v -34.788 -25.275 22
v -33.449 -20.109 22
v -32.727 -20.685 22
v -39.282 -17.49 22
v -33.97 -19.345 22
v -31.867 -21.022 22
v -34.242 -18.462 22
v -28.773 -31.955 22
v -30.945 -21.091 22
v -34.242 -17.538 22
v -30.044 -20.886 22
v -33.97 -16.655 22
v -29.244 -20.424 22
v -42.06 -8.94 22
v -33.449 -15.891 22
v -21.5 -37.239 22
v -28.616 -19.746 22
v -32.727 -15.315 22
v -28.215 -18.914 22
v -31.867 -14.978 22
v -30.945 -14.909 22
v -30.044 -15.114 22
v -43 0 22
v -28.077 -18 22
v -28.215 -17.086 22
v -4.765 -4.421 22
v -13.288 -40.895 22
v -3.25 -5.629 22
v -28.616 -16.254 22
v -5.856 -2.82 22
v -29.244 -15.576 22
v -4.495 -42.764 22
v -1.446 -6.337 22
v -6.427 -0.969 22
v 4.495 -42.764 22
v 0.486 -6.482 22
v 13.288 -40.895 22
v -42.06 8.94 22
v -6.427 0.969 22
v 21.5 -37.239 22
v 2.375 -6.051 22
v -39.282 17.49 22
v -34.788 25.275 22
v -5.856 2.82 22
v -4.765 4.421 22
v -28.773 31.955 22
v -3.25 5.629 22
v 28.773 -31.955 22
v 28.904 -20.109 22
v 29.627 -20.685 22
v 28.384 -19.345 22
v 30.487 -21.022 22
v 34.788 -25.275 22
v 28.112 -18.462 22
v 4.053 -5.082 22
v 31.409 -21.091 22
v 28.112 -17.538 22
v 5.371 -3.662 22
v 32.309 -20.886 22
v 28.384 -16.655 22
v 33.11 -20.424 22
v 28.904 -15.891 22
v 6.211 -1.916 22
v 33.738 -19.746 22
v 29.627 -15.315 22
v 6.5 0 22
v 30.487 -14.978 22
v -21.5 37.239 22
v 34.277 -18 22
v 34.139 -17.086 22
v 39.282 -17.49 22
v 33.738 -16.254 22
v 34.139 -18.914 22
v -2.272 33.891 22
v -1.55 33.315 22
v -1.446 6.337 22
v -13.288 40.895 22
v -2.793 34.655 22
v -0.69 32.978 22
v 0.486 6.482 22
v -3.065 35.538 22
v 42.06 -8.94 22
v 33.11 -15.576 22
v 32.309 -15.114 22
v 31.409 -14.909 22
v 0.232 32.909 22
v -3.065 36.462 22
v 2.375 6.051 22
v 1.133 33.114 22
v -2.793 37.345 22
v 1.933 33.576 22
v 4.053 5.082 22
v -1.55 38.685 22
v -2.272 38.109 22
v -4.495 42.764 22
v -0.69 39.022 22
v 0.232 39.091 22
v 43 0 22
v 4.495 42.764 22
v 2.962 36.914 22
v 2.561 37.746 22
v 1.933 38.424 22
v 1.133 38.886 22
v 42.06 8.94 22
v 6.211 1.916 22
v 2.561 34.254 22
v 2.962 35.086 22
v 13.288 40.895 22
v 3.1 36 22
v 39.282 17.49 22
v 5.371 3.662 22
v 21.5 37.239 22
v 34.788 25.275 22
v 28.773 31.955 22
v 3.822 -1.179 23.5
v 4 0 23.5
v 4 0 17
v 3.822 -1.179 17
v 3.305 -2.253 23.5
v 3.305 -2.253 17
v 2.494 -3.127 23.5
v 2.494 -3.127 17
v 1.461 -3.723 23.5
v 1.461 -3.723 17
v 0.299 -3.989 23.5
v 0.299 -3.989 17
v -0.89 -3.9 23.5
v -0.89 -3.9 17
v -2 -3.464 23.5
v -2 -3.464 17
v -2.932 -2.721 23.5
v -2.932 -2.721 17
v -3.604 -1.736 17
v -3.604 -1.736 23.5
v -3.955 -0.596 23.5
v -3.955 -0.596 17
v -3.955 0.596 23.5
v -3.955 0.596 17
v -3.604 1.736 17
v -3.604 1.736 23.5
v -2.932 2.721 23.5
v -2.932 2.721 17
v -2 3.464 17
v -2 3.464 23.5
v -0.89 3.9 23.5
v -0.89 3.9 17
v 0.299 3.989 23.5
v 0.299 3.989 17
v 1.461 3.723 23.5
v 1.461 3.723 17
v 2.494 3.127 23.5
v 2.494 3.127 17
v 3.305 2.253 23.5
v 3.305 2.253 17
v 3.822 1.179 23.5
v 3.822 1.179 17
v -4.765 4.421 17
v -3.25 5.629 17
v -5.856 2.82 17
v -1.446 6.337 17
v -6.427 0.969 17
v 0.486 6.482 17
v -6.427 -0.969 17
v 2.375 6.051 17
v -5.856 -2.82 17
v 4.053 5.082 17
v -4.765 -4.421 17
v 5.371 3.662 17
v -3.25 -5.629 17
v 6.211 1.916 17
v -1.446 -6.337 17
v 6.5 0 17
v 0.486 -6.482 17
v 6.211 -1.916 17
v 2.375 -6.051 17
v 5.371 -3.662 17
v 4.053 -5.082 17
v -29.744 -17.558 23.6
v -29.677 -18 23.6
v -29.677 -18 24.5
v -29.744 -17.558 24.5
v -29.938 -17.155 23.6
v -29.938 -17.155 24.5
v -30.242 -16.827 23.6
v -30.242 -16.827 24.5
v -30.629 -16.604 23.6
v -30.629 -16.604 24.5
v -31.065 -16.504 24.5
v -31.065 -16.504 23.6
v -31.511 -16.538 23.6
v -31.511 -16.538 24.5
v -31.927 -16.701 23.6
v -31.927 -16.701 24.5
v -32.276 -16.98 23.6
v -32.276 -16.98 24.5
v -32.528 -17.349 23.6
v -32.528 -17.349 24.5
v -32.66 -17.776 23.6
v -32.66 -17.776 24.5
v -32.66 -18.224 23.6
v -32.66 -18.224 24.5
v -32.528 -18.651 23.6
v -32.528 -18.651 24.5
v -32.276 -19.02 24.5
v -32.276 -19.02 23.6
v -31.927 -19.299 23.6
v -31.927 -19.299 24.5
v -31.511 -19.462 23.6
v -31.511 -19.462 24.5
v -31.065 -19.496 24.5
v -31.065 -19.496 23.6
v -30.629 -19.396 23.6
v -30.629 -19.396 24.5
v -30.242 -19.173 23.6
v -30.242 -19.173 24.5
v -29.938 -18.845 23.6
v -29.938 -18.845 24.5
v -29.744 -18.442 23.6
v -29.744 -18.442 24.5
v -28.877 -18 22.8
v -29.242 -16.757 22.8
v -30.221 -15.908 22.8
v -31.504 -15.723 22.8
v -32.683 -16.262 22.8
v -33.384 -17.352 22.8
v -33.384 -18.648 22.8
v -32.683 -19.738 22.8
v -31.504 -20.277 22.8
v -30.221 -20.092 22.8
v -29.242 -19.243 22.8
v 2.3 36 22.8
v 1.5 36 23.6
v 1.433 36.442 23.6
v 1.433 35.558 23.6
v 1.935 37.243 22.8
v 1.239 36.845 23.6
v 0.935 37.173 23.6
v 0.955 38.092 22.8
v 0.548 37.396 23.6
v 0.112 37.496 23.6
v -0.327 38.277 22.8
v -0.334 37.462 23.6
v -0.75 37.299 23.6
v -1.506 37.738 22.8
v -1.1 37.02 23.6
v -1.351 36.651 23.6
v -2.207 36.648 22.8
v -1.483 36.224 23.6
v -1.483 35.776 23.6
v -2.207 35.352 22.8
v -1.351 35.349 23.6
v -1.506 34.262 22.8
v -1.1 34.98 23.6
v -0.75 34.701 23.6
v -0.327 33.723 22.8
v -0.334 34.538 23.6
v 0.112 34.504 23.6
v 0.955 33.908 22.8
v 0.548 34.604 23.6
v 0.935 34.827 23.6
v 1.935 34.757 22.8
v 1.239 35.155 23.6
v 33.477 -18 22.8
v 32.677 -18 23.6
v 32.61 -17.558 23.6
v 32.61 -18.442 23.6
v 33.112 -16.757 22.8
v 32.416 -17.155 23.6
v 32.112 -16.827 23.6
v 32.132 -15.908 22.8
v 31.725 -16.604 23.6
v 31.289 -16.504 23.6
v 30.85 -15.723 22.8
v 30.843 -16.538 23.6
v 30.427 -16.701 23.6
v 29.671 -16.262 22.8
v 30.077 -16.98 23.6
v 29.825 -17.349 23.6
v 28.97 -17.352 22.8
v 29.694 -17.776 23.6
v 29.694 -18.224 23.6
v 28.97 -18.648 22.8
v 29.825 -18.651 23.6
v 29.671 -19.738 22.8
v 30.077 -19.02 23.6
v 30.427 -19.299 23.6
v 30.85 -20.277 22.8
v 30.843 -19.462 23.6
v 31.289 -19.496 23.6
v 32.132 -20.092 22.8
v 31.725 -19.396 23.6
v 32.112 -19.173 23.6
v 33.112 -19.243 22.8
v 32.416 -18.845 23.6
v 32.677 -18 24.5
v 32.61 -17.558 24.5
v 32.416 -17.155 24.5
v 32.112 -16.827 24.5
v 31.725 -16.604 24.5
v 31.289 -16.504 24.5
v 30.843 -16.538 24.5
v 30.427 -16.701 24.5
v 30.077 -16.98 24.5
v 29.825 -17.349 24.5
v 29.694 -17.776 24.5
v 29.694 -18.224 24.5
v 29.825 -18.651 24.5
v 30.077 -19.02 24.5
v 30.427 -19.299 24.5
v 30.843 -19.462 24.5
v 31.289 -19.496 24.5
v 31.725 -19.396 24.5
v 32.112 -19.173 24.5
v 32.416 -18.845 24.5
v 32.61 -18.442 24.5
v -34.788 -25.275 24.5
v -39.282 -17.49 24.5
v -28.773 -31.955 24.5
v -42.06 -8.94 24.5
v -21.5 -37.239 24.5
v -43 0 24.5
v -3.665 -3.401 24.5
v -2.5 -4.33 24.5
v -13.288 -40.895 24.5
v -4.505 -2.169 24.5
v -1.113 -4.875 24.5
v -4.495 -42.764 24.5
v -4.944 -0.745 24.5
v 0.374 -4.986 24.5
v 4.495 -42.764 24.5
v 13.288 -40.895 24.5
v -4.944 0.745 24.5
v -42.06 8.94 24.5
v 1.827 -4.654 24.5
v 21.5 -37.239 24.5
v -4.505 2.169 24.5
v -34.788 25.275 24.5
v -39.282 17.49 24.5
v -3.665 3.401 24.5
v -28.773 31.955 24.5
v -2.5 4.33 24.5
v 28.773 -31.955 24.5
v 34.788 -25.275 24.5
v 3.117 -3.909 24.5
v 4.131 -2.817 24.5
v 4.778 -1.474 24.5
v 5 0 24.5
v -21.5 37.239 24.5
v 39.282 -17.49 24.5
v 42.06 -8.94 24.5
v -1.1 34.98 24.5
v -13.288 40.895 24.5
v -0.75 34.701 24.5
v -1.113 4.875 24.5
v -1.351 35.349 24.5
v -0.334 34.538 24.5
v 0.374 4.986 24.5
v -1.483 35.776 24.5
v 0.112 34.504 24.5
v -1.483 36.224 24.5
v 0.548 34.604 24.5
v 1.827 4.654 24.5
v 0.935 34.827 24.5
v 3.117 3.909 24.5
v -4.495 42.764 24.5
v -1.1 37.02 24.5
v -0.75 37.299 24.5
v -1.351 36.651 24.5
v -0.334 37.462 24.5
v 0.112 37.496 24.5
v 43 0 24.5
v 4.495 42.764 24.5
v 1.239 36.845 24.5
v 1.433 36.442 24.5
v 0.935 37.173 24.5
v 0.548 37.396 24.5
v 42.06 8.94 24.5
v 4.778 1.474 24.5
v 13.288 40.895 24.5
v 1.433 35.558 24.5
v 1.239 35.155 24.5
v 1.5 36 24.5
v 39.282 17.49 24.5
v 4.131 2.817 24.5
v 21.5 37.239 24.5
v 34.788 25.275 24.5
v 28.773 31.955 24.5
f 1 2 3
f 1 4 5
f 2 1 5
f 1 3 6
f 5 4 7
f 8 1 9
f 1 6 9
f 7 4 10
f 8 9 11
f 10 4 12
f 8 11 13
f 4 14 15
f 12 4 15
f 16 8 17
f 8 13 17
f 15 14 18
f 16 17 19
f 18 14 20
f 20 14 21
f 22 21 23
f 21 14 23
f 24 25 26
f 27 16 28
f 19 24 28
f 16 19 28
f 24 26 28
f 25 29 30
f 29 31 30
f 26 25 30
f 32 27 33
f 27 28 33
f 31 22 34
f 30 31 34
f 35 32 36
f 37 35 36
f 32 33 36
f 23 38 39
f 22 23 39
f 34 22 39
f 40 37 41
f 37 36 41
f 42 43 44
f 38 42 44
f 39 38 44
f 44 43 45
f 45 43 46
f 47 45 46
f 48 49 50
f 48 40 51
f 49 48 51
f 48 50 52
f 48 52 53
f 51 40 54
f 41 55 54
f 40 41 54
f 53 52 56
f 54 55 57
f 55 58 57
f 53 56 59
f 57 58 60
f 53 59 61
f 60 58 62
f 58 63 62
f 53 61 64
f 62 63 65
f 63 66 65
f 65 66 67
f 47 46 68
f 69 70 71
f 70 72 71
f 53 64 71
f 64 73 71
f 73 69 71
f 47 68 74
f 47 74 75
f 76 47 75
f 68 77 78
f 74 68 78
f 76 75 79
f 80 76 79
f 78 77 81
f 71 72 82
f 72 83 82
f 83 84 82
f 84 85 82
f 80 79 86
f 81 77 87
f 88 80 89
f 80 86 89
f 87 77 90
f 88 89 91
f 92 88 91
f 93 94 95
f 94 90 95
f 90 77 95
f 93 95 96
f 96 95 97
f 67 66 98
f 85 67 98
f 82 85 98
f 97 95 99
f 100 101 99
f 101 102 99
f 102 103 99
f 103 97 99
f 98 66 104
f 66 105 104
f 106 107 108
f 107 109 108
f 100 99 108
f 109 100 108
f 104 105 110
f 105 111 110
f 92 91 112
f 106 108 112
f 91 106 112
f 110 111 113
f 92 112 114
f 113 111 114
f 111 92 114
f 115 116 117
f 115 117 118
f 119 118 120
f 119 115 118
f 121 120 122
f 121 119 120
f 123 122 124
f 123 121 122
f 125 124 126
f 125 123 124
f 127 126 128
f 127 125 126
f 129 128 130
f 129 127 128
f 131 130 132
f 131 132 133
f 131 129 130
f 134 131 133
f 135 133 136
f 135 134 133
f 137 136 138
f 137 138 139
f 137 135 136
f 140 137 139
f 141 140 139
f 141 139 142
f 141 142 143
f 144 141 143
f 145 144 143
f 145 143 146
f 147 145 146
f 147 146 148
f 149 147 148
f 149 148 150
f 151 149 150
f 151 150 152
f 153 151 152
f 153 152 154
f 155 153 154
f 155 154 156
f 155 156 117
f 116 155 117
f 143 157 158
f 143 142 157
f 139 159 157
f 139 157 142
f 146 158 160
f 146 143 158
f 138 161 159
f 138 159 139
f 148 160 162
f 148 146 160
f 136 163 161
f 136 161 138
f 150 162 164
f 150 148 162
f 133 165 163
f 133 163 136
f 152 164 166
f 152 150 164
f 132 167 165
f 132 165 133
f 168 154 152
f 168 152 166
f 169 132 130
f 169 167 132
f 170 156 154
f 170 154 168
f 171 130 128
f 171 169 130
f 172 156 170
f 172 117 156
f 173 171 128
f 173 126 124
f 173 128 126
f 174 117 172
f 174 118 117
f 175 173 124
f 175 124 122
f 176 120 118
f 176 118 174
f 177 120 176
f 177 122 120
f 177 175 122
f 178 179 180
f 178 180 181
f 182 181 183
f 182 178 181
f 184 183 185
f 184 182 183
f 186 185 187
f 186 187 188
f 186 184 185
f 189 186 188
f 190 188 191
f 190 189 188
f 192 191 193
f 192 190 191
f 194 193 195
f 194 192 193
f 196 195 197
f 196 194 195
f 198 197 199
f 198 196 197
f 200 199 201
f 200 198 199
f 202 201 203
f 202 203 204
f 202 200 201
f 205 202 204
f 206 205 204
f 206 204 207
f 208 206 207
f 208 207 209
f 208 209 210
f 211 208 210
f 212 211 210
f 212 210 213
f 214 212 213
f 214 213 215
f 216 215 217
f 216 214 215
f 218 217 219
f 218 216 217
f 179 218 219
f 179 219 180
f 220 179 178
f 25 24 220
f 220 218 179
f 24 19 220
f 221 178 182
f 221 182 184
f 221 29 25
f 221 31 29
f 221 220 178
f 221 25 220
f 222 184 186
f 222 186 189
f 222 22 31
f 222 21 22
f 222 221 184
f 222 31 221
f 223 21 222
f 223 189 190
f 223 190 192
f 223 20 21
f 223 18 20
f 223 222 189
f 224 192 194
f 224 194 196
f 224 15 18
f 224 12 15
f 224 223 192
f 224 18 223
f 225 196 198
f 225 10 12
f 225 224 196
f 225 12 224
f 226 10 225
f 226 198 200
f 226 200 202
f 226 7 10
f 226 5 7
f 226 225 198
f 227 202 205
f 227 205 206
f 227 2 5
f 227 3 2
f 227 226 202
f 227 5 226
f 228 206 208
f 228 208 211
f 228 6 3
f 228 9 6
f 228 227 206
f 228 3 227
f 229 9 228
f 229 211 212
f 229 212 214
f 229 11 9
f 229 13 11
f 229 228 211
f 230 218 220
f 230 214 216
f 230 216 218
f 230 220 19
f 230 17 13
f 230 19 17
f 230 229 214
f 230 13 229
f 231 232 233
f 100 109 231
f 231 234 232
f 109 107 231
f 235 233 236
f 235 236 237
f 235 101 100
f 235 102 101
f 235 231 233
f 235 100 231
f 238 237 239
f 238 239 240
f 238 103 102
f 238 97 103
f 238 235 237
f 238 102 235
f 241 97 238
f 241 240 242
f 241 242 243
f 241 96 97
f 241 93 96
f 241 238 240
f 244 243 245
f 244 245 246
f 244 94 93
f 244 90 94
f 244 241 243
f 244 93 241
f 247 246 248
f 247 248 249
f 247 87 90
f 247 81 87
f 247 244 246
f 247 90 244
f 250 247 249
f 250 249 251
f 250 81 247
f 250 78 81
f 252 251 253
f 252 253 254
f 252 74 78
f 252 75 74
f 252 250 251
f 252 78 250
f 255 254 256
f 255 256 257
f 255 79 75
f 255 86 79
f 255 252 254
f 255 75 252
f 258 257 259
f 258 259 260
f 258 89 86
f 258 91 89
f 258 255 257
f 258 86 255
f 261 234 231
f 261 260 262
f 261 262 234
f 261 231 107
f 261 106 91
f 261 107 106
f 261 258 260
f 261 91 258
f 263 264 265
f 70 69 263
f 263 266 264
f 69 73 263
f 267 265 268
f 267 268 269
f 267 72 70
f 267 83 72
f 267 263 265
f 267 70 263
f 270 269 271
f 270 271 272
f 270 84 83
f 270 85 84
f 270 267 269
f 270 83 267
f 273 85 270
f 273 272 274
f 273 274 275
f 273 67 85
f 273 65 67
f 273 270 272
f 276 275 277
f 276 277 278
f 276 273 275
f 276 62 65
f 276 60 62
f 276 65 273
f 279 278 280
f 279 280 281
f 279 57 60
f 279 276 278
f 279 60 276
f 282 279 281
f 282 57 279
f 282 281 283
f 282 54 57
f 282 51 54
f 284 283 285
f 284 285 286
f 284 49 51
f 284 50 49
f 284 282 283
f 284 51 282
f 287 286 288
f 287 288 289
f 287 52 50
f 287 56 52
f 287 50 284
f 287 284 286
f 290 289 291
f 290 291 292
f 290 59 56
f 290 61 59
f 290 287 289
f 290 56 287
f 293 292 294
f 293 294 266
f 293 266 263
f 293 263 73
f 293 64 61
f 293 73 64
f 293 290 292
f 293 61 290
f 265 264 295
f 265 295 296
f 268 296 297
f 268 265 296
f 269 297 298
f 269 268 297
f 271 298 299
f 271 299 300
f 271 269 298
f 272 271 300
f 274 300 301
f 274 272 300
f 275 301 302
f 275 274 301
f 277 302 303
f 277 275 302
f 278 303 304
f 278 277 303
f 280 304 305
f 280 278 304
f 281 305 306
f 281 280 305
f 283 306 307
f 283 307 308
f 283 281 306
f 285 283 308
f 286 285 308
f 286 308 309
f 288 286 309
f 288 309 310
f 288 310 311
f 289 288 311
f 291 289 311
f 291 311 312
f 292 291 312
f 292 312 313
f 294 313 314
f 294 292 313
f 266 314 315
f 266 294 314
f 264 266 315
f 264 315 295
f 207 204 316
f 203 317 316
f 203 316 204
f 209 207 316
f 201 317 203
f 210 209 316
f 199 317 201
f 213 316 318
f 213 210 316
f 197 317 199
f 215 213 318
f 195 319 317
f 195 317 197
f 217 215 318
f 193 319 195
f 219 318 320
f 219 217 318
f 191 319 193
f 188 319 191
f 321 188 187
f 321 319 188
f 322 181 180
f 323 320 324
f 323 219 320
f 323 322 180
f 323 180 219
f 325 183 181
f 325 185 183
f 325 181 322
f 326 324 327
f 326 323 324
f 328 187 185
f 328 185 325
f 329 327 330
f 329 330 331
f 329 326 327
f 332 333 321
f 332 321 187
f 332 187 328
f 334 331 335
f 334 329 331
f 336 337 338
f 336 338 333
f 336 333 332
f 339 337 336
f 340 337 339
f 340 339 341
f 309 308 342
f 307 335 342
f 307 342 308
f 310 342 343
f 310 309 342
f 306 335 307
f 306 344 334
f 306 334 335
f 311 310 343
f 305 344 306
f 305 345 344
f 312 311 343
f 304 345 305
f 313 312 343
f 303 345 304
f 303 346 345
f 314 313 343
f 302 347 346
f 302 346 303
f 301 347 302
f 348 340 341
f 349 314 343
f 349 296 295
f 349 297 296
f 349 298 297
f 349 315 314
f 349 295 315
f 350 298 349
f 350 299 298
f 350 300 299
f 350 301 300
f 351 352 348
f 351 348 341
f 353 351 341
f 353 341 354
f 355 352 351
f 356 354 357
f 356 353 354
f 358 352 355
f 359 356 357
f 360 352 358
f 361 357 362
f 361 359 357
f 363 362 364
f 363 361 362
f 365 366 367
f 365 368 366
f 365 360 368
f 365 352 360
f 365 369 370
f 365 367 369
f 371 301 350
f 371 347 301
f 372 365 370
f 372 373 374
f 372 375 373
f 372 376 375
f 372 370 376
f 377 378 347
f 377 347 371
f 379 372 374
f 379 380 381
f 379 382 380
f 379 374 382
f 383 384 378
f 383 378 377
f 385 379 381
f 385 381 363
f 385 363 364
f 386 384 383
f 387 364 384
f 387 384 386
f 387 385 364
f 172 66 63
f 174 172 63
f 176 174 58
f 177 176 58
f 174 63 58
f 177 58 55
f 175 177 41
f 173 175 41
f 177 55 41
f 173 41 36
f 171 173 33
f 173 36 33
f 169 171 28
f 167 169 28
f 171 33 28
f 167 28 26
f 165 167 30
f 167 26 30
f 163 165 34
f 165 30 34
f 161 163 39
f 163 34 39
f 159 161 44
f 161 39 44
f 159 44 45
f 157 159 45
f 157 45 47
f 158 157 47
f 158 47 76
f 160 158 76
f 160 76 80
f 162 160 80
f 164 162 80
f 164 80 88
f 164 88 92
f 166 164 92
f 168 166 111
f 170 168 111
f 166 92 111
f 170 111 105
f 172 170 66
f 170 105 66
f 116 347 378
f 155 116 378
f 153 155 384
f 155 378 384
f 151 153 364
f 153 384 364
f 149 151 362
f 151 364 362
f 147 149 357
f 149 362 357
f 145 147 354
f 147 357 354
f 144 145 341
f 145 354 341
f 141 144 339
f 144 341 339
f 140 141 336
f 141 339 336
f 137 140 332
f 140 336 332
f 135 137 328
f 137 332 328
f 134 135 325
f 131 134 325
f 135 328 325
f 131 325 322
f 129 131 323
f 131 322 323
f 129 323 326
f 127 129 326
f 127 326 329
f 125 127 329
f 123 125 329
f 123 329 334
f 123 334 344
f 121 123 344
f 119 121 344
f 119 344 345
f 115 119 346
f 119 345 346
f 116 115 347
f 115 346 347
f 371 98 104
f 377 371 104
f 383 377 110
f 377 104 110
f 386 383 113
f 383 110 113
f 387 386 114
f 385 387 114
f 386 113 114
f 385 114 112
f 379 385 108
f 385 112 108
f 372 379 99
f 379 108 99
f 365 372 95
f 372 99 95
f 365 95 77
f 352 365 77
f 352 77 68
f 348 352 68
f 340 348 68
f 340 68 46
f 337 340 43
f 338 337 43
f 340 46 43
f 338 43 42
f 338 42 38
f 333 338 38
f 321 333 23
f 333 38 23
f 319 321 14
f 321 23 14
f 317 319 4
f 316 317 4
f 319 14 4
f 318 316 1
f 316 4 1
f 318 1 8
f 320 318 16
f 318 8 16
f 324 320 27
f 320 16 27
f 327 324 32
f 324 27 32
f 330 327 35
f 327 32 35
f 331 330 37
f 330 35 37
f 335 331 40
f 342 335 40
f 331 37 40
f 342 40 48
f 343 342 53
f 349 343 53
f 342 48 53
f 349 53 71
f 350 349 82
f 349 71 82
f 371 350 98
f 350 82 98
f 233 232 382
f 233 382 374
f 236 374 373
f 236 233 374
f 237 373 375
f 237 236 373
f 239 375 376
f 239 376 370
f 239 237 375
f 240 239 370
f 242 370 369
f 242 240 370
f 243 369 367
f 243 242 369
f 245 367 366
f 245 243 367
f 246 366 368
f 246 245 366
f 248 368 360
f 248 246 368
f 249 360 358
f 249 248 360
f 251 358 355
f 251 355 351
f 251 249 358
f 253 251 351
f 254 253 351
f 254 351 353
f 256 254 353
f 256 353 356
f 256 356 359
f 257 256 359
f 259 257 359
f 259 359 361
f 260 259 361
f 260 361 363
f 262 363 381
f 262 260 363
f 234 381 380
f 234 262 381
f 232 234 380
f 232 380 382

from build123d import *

# Parameters (mm, degrees)
SKETCH006_R     = 43
SKETCH006_R_2   = 1.5
SKETCH006_R_3   = 4
PAD_DEPTH       = 2.5
CHAMFER001_SIZE = 1.6
SKETCH_R        = 6.5
SKETCH_R_2      = 4
PAD001_DEPTH    = 5
CHAMFER_SIZE    = 1


with BuildPart() as part:
    # Sketch006 → Pad (new body)
    with BuildSketch(Plane.XY.offset(22)):
        Circle(SKETCH006_R)
        with Locations((0, 36)):
            Circle(SKETCH006_R_2, mode=Mode.SUBTRACT)
        with Locations((31.176915, -18)):
            Circle(SKETCH006_R_2, mode=Mode.SUBTRACT)
        with Locations((-31.176915, -18)):
            Circle(SKETCH006_R_2, mode=Mode.SUBTRACT)
        Circle(SKETCH006_R_3, mode=Mode.SUBTRACT)
    extrude(amount=PAD_DEPTH)

    # Chamfer001
    chamfer001_edges = [part.edges().sort_by_distance(p)[0] for p in [
        (-32.676915, -18, 22),
        (29.676915, -18, 22),
        (-1.5, 36, 22),
    ]]
    chamfer(chamfer001_edges, length=CHAMFER001_SIZE)

    # Sketch (on Face4 of Chamfer001) → Pad001 (join)
    with BuildSketch(Plane(origin=(0, 0, 22), x_dir=(1, 0, 0), z_dir=(0, 0, -1))):
        Circle(SKETCH_R)
        Circle(SKETCH_R_2, mode=Mode.SUBTRACT)
    extrude(amount=PAD001_DEPTH)

    # Chamfer
    chamfer_edges = [part.edges().sort_by_distance(p)[0] for p in [
        (-4, 0, 24.5),
    ]]
    chamfer(chamfer_edges, length=CHAMFER_SIZE)


solid = part.part
